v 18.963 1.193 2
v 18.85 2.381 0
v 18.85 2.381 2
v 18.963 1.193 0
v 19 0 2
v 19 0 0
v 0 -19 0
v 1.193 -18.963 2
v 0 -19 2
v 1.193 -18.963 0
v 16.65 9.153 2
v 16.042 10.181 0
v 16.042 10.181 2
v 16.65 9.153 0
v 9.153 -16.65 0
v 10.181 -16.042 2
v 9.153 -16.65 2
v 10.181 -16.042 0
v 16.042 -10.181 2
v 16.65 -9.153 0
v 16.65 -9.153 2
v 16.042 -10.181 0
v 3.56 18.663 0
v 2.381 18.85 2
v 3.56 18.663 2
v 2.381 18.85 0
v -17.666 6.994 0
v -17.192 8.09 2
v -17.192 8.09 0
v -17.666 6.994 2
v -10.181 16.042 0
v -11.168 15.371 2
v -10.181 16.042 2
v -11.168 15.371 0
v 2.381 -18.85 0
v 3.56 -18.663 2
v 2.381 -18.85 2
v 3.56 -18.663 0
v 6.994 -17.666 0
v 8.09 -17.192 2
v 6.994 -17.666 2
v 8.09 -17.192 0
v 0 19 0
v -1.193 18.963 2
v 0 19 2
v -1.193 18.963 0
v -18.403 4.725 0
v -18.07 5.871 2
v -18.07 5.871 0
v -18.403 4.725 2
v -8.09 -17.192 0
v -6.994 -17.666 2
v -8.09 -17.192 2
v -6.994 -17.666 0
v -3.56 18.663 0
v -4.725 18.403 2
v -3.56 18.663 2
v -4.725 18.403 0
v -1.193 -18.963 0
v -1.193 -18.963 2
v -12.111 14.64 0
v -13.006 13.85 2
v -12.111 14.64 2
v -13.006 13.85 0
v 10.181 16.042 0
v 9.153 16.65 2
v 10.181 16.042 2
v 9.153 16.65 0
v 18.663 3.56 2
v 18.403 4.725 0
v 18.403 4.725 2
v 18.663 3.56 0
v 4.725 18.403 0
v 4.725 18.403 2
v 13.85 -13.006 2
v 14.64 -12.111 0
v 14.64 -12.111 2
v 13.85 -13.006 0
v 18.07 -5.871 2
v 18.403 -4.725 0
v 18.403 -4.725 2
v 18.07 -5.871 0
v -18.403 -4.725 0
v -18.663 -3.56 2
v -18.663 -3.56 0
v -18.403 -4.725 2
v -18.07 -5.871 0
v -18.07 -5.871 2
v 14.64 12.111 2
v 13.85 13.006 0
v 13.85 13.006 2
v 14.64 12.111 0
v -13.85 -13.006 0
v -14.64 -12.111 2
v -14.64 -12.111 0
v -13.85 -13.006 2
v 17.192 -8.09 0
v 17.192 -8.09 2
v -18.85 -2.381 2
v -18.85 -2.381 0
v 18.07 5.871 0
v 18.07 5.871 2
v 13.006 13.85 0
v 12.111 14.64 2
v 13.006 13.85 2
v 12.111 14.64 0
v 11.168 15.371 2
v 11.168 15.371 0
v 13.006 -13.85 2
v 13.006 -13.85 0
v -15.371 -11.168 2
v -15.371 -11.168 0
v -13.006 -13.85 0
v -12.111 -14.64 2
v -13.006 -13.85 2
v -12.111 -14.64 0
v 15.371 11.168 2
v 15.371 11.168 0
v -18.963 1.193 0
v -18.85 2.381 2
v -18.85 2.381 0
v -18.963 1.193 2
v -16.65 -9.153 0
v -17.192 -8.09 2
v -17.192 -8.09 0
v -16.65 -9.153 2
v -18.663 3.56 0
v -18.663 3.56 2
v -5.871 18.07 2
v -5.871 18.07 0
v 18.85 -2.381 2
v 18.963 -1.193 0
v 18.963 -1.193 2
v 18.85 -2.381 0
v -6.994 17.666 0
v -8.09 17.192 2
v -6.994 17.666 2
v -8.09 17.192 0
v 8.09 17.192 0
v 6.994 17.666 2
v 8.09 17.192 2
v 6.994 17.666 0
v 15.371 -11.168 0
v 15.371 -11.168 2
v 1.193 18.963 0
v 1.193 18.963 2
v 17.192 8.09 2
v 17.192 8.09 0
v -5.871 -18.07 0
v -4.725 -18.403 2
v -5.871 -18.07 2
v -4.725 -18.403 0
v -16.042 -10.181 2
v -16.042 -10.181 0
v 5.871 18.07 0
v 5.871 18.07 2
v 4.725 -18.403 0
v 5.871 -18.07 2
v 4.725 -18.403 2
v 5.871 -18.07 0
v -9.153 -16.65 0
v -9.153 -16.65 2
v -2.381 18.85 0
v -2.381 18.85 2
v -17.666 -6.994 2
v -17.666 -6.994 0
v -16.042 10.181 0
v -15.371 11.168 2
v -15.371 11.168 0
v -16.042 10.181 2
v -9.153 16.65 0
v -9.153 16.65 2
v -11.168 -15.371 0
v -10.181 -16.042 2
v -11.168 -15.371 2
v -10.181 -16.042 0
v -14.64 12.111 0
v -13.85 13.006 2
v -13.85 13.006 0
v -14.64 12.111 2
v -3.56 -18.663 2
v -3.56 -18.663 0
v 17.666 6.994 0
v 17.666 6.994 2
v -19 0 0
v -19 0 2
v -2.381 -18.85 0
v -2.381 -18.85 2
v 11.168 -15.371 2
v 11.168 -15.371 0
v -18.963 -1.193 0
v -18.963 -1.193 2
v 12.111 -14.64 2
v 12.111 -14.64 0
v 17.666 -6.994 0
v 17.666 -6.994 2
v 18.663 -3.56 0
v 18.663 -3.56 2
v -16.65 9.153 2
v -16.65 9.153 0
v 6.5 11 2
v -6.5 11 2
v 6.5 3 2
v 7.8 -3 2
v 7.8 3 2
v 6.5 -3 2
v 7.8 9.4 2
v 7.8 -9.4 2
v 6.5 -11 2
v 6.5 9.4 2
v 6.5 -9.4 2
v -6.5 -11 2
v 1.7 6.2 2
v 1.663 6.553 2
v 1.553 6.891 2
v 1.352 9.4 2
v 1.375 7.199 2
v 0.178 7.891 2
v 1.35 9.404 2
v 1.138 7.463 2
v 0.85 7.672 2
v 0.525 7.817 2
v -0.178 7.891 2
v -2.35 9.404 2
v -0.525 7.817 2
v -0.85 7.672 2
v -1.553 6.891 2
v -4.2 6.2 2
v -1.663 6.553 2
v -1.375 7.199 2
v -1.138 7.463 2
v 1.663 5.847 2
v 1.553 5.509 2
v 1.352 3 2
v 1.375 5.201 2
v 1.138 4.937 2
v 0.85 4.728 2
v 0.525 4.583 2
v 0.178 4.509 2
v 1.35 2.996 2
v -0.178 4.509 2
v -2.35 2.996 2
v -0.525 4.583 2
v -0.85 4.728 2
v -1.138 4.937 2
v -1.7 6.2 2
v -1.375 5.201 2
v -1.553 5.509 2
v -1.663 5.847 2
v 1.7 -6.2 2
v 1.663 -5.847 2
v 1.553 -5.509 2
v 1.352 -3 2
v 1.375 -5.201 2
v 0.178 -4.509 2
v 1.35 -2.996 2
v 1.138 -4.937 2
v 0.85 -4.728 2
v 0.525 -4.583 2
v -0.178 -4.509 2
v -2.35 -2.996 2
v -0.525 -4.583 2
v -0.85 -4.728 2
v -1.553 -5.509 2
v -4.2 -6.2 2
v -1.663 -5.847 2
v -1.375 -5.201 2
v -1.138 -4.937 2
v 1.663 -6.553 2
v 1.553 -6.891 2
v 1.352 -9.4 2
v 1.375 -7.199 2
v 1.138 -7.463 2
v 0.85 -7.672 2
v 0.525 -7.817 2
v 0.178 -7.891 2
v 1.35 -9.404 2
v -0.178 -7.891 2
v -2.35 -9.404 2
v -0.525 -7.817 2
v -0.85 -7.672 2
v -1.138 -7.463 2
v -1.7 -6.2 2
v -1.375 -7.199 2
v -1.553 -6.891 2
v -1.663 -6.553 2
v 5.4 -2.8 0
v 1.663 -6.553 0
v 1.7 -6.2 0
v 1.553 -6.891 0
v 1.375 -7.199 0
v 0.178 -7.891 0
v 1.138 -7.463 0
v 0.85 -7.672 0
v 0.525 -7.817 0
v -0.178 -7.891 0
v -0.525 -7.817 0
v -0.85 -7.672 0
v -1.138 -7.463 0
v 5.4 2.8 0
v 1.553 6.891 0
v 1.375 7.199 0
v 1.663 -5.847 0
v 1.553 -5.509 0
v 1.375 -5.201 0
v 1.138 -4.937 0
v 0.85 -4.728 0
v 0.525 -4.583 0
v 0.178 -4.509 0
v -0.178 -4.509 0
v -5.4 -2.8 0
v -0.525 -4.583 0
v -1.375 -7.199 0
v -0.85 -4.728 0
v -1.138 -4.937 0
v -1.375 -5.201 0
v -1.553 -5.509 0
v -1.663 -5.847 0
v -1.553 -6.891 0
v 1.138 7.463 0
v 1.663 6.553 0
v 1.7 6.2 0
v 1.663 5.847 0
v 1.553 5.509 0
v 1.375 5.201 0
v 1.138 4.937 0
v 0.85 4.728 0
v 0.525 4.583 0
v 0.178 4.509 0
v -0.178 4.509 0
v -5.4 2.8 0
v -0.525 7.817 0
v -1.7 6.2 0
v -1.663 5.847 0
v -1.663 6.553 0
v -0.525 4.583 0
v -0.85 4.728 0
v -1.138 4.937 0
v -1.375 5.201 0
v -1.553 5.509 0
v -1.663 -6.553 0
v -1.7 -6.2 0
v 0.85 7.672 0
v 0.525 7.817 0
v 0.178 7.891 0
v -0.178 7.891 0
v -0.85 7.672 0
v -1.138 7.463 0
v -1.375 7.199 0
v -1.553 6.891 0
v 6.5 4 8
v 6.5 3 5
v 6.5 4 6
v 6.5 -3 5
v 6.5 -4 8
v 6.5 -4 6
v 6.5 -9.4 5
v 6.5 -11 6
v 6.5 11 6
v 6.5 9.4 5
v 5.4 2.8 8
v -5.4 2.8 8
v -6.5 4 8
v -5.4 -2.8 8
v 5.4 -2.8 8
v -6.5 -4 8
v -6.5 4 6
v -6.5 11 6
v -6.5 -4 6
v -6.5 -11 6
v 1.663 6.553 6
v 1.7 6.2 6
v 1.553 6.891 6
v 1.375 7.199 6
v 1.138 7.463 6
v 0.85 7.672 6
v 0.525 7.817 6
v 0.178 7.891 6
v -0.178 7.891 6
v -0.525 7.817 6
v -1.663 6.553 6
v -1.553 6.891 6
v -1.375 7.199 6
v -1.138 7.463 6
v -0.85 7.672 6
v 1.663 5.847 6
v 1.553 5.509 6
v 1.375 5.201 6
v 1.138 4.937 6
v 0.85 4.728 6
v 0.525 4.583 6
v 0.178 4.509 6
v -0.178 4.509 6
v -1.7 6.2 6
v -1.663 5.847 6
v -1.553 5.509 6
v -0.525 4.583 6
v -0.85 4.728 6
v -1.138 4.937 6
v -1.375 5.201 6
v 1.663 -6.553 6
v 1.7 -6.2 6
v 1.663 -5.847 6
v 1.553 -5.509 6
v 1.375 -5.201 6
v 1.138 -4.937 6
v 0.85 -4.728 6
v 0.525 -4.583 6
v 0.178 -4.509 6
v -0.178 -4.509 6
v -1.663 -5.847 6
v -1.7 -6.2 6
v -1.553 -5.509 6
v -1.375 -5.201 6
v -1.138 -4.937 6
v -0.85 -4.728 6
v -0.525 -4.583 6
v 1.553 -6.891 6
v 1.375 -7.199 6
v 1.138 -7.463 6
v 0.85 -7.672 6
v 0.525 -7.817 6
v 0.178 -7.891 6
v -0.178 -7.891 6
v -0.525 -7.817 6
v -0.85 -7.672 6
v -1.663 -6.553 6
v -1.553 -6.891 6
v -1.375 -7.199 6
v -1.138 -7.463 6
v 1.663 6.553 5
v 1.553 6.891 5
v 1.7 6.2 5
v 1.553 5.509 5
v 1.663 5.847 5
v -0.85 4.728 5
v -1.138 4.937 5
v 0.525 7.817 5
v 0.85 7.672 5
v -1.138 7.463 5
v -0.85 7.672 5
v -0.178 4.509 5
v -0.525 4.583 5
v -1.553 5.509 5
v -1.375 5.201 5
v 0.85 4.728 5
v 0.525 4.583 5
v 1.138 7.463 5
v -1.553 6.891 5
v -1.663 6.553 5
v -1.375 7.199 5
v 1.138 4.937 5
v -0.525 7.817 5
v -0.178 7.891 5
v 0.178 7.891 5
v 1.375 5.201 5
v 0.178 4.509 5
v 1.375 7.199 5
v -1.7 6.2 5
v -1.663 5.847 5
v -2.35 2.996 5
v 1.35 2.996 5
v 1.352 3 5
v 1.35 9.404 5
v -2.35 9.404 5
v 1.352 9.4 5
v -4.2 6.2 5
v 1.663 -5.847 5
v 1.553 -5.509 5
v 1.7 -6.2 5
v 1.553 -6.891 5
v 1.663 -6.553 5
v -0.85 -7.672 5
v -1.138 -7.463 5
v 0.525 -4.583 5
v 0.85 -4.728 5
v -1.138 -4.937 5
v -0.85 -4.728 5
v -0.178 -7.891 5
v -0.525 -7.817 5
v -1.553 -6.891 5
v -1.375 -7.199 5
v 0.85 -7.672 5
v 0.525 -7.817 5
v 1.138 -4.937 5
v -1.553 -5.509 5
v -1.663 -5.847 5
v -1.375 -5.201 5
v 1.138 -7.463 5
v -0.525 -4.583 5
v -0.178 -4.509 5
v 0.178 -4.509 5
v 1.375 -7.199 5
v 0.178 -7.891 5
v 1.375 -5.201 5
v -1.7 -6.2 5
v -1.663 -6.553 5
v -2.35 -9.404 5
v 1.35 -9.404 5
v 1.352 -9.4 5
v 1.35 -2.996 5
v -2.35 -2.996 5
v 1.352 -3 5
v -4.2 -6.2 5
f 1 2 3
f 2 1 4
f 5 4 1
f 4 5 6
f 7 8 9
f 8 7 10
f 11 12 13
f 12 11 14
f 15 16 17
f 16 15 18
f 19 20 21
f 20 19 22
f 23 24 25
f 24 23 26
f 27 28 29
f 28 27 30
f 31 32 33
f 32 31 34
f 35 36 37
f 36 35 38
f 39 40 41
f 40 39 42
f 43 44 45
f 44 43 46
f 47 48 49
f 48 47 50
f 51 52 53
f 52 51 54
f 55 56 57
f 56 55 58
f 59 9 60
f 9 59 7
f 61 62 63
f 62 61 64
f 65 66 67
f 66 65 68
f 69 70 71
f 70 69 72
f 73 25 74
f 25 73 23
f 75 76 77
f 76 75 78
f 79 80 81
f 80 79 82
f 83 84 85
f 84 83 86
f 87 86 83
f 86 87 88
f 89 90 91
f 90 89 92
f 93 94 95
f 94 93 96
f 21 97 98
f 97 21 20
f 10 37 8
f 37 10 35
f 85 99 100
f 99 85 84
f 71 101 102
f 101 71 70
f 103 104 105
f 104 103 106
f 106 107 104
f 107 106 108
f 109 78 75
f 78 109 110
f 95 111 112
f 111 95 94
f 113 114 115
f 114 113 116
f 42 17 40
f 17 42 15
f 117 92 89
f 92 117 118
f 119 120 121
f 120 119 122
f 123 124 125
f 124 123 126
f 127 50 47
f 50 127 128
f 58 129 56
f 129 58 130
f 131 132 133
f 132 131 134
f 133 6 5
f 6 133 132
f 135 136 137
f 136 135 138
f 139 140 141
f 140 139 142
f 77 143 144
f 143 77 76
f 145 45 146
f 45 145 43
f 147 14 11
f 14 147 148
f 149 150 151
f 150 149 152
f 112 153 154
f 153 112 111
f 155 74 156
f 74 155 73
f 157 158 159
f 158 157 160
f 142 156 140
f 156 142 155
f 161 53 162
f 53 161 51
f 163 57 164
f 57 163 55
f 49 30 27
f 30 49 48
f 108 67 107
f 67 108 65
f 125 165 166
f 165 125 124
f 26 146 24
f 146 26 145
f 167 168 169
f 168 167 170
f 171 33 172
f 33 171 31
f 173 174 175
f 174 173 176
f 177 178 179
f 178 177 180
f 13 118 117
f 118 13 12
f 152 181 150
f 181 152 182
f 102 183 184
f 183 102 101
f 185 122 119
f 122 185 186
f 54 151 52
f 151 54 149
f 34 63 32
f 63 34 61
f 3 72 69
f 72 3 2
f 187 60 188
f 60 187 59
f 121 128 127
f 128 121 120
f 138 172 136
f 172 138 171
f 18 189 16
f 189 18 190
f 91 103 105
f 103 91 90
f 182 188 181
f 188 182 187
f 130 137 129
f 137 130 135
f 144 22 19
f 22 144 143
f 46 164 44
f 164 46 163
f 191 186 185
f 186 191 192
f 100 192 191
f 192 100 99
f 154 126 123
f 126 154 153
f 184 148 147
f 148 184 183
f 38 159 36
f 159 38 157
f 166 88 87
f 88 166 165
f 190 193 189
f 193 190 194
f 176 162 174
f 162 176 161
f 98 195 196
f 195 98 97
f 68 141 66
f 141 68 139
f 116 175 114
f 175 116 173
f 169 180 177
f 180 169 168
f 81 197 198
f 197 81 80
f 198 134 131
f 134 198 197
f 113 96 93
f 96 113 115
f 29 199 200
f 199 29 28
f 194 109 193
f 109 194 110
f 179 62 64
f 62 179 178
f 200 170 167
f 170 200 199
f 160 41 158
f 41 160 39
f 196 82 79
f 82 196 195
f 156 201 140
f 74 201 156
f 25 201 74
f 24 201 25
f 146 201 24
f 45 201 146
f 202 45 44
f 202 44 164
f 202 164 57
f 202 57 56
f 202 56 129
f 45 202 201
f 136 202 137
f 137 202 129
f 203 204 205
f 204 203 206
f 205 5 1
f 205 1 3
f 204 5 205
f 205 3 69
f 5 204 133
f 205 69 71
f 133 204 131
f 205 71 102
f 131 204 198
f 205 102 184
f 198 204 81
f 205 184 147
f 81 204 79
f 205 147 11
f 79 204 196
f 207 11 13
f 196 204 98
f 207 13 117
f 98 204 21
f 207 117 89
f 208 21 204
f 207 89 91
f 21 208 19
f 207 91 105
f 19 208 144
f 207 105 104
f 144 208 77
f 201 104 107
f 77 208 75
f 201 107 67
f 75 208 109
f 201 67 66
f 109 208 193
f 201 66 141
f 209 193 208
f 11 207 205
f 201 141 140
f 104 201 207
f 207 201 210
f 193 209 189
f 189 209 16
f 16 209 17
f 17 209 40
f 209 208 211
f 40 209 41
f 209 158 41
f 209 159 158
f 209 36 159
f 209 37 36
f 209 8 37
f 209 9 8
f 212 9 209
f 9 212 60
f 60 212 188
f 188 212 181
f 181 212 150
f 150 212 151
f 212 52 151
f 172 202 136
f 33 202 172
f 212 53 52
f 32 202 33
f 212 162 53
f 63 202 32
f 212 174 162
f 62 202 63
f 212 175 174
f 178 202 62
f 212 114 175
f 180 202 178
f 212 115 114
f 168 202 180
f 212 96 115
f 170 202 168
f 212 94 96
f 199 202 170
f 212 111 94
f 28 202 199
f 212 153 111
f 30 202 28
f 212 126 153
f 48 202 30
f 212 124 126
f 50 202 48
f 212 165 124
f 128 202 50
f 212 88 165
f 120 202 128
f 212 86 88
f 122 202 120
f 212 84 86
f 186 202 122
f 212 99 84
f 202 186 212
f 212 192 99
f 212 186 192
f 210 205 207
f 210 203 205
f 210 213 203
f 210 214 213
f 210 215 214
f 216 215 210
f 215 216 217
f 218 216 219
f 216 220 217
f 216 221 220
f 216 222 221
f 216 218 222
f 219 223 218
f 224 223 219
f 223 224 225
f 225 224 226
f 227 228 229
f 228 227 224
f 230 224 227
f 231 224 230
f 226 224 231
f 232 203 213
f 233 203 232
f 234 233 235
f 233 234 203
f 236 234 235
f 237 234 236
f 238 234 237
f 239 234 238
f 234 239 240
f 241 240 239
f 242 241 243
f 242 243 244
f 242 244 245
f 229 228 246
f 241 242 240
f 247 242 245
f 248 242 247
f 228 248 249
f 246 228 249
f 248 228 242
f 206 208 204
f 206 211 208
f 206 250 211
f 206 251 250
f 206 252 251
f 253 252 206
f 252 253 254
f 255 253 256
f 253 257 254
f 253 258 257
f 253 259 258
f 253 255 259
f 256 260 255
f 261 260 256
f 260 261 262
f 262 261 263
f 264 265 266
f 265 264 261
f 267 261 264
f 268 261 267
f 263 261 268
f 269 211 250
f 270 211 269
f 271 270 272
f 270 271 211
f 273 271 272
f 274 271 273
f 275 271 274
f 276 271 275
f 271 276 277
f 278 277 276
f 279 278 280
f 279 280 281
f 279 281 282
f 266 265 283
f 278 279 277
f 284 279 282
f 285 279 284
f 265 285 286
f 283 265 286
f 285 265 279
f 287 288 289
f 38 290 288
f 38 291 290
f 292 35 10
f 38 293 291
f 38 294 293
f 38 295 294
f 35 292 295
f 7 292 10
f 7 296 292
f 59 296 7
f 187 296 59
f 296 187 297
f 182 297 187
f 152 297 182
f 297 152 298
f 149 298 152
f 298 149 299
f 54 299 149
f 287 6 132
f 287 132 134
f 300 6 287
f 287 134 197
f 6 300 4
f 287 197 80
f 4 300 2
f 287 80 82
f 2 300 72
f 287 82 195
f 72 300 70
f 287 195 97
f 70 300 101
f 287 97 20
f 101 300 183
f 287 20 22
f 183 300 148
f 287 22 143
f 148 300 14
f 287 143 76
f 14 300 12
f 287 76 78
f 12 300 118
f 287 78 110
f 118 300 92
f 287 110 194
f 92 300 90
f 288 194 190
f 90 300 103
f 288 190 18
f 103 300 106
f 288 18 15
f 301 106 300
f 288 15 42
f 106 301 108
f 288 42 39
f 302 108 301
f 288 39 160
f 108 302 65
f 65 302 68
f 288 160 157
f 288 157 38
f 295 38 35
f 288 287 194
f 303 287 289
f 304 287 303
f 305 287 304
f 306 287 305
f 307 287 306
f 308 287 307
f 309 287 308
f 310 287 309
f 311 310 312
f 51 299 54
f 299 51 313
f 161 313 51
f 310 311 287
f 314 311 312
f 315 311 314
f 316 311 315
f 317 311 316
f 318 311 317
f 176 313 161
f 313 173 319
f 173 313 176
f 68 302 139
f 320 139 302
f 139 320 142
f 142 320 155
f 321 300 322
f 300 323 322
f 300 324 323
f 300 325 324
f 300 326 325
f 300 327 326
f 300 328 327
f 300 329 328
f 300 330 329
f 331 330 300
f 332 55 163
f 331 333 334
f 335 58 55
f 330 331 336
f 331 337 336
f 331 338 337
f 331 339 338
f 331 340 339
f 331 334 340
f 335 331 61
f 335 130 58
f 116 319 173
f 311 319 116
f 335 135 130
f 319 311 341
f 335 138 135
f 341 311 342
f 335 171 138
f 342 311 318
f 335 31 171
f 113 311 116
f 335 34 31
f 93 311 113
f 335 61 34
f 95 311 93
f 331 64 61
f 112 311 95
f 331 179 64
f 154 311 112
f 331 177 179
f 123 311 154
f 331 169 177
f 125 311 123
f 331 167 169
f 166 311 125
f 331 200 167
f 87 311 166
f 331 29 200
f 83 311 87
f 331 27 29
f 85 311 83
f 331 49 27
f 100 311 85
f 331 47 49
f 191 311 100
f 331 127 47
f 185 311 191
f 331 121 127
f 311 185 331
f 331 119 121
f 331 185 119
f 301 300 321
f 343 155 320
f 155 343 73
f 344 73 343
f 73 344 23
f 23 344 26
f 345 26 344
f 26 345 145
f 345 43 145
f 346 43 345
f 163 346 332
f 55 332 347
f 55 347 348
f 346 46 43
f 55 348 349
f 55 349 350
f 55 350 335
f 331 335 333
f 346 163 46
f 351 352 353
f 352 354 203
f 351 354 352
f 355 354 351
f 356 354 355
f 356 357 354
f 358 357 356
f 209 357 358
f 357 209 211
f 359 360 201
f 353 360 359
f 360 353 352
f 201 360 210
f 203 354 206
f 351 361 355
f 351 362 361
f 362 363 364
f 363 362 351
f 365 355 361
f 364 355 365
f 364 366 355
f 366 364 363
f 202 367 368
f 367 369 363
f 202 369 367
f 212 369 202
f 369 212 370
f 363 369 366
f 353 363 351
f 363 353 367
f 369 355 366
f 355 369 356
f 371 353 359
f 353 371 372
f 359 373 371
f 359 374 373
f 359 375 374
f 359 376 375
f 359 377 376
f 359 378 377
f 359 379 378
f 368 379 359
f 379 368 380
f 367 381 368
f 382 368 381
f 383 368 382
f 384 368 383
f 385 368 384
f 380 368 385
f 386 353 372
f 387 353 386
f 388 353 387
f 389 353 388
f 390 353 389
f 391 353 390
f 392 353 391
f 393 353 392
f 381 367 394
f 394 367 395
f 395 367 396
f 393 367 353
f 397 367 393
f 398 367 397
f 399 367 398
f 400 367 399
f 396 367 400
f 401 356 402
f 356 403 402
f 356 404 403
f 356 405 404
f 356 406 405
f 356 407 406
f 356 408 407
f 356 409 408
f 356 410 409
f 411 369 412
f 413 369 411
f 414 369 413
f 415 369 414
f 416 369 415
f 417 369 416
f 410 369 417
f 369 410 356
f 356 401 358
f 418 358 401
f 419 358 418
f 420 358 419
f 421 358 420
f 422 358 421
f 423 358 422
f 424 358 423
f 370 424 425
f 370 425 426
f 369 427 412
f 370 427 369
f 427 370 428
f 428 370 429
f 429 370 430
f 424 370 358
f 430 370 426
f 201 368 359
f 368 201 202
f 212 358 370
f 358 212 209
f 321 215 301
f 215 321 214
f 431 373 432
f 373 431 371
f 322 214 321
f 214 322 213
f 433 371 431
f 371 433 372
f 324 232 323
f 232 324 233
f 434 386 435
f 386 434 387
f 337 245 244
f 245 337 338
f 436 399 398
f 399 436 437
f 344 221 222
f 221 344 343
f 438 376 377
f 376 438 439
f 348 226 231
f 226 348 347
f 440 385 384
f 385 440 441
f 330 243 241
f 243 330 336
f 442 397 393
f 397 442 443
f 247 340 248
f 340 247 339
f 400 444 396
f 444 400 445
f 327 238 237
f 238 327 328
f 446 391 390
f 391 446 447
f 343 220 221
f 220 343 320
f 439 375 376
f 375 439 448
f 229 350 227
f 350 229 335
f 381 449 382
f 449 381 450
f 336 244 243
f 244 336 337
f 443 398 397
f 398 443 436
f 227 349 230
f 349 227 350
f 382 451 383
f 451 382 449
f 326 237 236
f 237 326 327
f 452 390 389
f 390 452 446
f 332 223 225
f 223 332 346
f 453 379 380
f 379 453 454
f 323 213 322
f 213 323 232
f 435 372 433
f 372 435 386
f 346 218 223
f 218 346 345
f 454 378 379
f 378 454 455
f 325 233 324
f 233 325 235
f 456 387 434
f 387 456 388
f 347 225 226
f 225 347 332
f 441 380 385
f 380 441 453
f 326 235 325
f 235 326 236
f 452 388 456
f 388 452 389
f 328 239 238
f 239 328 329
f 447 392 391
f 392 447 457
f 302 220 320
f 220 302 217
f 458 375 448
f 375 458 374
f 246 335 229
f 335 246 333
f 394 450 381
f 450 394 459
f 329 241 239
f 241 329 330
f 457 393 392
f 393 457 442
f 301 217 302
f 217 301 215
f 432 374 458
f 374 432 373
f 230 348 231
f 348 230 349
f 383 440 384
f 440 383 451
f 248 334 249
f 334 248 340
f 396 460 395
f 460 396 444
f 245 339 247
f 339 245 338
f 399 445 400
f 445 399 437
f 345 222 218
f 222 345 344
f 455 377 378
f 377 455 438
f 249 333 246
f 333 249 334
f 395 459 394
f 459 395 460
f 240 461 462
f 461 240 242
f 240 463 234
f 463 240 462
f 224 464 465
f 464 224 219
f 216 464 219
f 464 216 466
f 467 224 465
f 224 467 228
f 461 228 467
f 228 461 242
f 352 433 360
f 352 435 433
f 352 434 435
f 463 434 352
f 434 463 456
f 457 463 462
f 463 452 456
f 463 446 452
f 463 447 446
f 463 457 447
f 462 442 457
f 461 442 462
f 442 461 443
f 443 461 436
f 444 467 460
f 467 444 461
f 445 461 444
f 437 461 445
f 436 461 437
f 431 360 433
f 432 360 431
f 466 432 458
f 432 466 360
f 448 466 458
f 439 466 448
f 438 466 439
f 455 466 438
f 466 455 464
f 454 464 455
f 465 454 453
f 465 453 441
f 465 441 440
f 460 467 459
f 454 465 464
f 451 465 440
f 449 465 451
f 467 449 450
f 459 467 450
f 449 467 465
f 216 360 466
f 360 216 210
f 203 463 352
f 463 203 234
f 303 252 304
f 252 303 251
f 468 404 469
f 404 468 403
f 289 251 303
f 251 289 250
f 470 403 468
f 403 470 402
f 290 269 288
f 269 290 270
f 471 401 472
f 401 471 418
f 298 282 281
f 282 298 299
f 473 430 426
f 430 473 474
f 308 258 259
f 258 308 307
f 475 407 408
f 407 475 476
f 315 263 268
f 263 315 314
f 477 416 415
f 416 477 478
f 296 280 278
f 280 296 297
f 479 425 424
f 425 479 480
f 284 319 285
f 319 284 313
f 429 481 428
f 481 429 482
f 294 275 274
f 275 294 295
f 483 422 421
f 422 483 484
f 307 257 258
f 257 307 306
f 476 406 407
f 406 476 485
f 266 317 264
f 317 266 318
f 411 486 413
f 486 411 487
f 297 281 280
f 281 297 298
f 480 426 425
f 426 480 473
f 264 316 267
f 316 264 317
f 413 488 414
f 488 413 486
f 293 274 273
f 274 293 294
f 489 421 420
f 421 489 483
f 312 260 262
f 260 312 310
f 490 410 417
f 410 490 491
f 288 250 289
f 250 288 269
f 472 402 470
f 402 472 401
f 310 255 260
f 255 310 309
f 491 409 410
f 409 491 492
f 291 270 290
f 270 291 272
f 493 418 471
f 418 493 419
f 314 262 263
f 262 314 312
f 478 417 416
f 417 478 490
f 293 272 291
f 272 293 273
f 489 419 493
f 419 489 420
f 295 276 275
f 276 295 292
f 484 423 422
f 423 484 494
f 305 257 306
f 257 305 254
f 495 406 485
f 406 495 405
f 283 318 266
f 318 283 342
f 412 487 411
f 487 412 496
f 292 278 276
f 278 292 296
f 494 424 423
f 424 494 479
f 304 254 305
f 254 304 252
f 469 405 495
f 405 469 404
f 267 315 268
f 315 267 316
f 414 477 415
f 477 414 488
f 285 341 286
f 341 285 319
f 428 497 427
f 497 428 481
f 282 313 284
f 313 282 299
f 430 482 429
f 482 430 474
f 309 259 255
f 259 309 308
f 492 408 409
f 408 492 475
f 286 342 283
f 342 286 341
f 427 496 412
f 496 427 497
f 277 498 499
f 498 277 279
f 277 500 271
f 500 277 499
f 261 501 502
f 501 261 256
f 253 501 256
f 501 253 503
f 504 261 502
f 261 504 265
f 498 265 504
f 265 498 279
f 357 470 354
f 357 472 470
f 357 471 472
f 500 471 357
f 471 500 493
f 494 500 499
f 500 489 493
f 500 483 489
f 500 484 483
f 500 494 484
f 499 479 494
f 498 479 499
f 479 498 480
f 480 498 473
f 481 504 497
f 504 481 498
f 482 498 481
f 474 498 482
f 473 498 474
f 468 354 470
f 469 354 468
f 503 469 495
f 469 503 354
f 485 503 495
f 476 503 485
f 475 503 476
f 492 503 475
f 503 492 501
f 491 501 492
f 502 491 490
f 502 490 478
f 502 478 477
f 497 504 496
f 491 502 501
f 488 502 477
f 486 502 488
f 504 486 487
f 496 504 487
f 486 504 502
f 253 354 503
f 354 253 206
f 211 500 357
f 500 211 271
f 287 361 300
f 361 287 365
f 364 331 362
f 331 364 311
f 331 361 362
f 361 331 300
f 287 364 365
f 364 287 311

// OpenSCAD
module electromagnet_top(){
    
    difference(){
        union(){
            translate([0,0,16])cube([8,15,6], center=true);
            difference(){
                intersection(){
                    translate([0,0,-2])sphere(r=32, $fn=100);
                    translate([0,0,11])cylinder(r=22, h=22, $fn=100, center=true);
                }
                translate([0,0,9])cylinder(r=20, h=20, center=true);
            }
            for (a = [0:2]) {
              rotate(a*120) {
                translate([0, -20, 1.5])cylinder(r=10, h=3, center=true, $fn=52);
              }
            }
        }
        translate([0,0,9.5])cube([10.4,5.4,19], center=true);
        translate([0,6,-10])nut();
        translate([0,-6,-10])nut();
        translate([0,0,0])cylinder(r=20, h=10, center=true);
        for (a = [0:2]) {
          rotate(a*120) {
            translate([0, -25, 28])cylinder(r=4.6, h=50, center=true, $fn=52);
            translate([0, -25, 0])cylinder(r=1.7, h=50, center=true, $fn=52);
          }
        }
        translate([15,0,0])nut();
    }
}

module electromagnet_bottom(){
    difference(){
        union(){
            translate([0,0,1])cylinder(r=19, h=2, $fn=100, center=true);
            translate([0,0,4])cube([13,8,8], center=true);
            translate([0,0,3])cube([13,22,6], center=true);
        }
        translate([0,0,4])cube([10.8,5.6,10], center=true);
        translate([0,6.2,-3])rotate([0,0,0])nut();
        translate([0,-6.2,-3])rotate([0,0,0])nut();
    }
}

module nut(){
    union(){
        cylinder(35, 1.7, 1.7, $fn=30);
        translate([-0.5,0,5])cylinder(3, 3.7, 3.7, $fn=6);
        translate([-2.2,-3.20,5])cube([10,6.4,3]);
        translate([0,0,30])cylinder(3, 3.7, 3.7, $fn=20);
    }
}



electromagnet_bottom();
//electromagnet_top();
